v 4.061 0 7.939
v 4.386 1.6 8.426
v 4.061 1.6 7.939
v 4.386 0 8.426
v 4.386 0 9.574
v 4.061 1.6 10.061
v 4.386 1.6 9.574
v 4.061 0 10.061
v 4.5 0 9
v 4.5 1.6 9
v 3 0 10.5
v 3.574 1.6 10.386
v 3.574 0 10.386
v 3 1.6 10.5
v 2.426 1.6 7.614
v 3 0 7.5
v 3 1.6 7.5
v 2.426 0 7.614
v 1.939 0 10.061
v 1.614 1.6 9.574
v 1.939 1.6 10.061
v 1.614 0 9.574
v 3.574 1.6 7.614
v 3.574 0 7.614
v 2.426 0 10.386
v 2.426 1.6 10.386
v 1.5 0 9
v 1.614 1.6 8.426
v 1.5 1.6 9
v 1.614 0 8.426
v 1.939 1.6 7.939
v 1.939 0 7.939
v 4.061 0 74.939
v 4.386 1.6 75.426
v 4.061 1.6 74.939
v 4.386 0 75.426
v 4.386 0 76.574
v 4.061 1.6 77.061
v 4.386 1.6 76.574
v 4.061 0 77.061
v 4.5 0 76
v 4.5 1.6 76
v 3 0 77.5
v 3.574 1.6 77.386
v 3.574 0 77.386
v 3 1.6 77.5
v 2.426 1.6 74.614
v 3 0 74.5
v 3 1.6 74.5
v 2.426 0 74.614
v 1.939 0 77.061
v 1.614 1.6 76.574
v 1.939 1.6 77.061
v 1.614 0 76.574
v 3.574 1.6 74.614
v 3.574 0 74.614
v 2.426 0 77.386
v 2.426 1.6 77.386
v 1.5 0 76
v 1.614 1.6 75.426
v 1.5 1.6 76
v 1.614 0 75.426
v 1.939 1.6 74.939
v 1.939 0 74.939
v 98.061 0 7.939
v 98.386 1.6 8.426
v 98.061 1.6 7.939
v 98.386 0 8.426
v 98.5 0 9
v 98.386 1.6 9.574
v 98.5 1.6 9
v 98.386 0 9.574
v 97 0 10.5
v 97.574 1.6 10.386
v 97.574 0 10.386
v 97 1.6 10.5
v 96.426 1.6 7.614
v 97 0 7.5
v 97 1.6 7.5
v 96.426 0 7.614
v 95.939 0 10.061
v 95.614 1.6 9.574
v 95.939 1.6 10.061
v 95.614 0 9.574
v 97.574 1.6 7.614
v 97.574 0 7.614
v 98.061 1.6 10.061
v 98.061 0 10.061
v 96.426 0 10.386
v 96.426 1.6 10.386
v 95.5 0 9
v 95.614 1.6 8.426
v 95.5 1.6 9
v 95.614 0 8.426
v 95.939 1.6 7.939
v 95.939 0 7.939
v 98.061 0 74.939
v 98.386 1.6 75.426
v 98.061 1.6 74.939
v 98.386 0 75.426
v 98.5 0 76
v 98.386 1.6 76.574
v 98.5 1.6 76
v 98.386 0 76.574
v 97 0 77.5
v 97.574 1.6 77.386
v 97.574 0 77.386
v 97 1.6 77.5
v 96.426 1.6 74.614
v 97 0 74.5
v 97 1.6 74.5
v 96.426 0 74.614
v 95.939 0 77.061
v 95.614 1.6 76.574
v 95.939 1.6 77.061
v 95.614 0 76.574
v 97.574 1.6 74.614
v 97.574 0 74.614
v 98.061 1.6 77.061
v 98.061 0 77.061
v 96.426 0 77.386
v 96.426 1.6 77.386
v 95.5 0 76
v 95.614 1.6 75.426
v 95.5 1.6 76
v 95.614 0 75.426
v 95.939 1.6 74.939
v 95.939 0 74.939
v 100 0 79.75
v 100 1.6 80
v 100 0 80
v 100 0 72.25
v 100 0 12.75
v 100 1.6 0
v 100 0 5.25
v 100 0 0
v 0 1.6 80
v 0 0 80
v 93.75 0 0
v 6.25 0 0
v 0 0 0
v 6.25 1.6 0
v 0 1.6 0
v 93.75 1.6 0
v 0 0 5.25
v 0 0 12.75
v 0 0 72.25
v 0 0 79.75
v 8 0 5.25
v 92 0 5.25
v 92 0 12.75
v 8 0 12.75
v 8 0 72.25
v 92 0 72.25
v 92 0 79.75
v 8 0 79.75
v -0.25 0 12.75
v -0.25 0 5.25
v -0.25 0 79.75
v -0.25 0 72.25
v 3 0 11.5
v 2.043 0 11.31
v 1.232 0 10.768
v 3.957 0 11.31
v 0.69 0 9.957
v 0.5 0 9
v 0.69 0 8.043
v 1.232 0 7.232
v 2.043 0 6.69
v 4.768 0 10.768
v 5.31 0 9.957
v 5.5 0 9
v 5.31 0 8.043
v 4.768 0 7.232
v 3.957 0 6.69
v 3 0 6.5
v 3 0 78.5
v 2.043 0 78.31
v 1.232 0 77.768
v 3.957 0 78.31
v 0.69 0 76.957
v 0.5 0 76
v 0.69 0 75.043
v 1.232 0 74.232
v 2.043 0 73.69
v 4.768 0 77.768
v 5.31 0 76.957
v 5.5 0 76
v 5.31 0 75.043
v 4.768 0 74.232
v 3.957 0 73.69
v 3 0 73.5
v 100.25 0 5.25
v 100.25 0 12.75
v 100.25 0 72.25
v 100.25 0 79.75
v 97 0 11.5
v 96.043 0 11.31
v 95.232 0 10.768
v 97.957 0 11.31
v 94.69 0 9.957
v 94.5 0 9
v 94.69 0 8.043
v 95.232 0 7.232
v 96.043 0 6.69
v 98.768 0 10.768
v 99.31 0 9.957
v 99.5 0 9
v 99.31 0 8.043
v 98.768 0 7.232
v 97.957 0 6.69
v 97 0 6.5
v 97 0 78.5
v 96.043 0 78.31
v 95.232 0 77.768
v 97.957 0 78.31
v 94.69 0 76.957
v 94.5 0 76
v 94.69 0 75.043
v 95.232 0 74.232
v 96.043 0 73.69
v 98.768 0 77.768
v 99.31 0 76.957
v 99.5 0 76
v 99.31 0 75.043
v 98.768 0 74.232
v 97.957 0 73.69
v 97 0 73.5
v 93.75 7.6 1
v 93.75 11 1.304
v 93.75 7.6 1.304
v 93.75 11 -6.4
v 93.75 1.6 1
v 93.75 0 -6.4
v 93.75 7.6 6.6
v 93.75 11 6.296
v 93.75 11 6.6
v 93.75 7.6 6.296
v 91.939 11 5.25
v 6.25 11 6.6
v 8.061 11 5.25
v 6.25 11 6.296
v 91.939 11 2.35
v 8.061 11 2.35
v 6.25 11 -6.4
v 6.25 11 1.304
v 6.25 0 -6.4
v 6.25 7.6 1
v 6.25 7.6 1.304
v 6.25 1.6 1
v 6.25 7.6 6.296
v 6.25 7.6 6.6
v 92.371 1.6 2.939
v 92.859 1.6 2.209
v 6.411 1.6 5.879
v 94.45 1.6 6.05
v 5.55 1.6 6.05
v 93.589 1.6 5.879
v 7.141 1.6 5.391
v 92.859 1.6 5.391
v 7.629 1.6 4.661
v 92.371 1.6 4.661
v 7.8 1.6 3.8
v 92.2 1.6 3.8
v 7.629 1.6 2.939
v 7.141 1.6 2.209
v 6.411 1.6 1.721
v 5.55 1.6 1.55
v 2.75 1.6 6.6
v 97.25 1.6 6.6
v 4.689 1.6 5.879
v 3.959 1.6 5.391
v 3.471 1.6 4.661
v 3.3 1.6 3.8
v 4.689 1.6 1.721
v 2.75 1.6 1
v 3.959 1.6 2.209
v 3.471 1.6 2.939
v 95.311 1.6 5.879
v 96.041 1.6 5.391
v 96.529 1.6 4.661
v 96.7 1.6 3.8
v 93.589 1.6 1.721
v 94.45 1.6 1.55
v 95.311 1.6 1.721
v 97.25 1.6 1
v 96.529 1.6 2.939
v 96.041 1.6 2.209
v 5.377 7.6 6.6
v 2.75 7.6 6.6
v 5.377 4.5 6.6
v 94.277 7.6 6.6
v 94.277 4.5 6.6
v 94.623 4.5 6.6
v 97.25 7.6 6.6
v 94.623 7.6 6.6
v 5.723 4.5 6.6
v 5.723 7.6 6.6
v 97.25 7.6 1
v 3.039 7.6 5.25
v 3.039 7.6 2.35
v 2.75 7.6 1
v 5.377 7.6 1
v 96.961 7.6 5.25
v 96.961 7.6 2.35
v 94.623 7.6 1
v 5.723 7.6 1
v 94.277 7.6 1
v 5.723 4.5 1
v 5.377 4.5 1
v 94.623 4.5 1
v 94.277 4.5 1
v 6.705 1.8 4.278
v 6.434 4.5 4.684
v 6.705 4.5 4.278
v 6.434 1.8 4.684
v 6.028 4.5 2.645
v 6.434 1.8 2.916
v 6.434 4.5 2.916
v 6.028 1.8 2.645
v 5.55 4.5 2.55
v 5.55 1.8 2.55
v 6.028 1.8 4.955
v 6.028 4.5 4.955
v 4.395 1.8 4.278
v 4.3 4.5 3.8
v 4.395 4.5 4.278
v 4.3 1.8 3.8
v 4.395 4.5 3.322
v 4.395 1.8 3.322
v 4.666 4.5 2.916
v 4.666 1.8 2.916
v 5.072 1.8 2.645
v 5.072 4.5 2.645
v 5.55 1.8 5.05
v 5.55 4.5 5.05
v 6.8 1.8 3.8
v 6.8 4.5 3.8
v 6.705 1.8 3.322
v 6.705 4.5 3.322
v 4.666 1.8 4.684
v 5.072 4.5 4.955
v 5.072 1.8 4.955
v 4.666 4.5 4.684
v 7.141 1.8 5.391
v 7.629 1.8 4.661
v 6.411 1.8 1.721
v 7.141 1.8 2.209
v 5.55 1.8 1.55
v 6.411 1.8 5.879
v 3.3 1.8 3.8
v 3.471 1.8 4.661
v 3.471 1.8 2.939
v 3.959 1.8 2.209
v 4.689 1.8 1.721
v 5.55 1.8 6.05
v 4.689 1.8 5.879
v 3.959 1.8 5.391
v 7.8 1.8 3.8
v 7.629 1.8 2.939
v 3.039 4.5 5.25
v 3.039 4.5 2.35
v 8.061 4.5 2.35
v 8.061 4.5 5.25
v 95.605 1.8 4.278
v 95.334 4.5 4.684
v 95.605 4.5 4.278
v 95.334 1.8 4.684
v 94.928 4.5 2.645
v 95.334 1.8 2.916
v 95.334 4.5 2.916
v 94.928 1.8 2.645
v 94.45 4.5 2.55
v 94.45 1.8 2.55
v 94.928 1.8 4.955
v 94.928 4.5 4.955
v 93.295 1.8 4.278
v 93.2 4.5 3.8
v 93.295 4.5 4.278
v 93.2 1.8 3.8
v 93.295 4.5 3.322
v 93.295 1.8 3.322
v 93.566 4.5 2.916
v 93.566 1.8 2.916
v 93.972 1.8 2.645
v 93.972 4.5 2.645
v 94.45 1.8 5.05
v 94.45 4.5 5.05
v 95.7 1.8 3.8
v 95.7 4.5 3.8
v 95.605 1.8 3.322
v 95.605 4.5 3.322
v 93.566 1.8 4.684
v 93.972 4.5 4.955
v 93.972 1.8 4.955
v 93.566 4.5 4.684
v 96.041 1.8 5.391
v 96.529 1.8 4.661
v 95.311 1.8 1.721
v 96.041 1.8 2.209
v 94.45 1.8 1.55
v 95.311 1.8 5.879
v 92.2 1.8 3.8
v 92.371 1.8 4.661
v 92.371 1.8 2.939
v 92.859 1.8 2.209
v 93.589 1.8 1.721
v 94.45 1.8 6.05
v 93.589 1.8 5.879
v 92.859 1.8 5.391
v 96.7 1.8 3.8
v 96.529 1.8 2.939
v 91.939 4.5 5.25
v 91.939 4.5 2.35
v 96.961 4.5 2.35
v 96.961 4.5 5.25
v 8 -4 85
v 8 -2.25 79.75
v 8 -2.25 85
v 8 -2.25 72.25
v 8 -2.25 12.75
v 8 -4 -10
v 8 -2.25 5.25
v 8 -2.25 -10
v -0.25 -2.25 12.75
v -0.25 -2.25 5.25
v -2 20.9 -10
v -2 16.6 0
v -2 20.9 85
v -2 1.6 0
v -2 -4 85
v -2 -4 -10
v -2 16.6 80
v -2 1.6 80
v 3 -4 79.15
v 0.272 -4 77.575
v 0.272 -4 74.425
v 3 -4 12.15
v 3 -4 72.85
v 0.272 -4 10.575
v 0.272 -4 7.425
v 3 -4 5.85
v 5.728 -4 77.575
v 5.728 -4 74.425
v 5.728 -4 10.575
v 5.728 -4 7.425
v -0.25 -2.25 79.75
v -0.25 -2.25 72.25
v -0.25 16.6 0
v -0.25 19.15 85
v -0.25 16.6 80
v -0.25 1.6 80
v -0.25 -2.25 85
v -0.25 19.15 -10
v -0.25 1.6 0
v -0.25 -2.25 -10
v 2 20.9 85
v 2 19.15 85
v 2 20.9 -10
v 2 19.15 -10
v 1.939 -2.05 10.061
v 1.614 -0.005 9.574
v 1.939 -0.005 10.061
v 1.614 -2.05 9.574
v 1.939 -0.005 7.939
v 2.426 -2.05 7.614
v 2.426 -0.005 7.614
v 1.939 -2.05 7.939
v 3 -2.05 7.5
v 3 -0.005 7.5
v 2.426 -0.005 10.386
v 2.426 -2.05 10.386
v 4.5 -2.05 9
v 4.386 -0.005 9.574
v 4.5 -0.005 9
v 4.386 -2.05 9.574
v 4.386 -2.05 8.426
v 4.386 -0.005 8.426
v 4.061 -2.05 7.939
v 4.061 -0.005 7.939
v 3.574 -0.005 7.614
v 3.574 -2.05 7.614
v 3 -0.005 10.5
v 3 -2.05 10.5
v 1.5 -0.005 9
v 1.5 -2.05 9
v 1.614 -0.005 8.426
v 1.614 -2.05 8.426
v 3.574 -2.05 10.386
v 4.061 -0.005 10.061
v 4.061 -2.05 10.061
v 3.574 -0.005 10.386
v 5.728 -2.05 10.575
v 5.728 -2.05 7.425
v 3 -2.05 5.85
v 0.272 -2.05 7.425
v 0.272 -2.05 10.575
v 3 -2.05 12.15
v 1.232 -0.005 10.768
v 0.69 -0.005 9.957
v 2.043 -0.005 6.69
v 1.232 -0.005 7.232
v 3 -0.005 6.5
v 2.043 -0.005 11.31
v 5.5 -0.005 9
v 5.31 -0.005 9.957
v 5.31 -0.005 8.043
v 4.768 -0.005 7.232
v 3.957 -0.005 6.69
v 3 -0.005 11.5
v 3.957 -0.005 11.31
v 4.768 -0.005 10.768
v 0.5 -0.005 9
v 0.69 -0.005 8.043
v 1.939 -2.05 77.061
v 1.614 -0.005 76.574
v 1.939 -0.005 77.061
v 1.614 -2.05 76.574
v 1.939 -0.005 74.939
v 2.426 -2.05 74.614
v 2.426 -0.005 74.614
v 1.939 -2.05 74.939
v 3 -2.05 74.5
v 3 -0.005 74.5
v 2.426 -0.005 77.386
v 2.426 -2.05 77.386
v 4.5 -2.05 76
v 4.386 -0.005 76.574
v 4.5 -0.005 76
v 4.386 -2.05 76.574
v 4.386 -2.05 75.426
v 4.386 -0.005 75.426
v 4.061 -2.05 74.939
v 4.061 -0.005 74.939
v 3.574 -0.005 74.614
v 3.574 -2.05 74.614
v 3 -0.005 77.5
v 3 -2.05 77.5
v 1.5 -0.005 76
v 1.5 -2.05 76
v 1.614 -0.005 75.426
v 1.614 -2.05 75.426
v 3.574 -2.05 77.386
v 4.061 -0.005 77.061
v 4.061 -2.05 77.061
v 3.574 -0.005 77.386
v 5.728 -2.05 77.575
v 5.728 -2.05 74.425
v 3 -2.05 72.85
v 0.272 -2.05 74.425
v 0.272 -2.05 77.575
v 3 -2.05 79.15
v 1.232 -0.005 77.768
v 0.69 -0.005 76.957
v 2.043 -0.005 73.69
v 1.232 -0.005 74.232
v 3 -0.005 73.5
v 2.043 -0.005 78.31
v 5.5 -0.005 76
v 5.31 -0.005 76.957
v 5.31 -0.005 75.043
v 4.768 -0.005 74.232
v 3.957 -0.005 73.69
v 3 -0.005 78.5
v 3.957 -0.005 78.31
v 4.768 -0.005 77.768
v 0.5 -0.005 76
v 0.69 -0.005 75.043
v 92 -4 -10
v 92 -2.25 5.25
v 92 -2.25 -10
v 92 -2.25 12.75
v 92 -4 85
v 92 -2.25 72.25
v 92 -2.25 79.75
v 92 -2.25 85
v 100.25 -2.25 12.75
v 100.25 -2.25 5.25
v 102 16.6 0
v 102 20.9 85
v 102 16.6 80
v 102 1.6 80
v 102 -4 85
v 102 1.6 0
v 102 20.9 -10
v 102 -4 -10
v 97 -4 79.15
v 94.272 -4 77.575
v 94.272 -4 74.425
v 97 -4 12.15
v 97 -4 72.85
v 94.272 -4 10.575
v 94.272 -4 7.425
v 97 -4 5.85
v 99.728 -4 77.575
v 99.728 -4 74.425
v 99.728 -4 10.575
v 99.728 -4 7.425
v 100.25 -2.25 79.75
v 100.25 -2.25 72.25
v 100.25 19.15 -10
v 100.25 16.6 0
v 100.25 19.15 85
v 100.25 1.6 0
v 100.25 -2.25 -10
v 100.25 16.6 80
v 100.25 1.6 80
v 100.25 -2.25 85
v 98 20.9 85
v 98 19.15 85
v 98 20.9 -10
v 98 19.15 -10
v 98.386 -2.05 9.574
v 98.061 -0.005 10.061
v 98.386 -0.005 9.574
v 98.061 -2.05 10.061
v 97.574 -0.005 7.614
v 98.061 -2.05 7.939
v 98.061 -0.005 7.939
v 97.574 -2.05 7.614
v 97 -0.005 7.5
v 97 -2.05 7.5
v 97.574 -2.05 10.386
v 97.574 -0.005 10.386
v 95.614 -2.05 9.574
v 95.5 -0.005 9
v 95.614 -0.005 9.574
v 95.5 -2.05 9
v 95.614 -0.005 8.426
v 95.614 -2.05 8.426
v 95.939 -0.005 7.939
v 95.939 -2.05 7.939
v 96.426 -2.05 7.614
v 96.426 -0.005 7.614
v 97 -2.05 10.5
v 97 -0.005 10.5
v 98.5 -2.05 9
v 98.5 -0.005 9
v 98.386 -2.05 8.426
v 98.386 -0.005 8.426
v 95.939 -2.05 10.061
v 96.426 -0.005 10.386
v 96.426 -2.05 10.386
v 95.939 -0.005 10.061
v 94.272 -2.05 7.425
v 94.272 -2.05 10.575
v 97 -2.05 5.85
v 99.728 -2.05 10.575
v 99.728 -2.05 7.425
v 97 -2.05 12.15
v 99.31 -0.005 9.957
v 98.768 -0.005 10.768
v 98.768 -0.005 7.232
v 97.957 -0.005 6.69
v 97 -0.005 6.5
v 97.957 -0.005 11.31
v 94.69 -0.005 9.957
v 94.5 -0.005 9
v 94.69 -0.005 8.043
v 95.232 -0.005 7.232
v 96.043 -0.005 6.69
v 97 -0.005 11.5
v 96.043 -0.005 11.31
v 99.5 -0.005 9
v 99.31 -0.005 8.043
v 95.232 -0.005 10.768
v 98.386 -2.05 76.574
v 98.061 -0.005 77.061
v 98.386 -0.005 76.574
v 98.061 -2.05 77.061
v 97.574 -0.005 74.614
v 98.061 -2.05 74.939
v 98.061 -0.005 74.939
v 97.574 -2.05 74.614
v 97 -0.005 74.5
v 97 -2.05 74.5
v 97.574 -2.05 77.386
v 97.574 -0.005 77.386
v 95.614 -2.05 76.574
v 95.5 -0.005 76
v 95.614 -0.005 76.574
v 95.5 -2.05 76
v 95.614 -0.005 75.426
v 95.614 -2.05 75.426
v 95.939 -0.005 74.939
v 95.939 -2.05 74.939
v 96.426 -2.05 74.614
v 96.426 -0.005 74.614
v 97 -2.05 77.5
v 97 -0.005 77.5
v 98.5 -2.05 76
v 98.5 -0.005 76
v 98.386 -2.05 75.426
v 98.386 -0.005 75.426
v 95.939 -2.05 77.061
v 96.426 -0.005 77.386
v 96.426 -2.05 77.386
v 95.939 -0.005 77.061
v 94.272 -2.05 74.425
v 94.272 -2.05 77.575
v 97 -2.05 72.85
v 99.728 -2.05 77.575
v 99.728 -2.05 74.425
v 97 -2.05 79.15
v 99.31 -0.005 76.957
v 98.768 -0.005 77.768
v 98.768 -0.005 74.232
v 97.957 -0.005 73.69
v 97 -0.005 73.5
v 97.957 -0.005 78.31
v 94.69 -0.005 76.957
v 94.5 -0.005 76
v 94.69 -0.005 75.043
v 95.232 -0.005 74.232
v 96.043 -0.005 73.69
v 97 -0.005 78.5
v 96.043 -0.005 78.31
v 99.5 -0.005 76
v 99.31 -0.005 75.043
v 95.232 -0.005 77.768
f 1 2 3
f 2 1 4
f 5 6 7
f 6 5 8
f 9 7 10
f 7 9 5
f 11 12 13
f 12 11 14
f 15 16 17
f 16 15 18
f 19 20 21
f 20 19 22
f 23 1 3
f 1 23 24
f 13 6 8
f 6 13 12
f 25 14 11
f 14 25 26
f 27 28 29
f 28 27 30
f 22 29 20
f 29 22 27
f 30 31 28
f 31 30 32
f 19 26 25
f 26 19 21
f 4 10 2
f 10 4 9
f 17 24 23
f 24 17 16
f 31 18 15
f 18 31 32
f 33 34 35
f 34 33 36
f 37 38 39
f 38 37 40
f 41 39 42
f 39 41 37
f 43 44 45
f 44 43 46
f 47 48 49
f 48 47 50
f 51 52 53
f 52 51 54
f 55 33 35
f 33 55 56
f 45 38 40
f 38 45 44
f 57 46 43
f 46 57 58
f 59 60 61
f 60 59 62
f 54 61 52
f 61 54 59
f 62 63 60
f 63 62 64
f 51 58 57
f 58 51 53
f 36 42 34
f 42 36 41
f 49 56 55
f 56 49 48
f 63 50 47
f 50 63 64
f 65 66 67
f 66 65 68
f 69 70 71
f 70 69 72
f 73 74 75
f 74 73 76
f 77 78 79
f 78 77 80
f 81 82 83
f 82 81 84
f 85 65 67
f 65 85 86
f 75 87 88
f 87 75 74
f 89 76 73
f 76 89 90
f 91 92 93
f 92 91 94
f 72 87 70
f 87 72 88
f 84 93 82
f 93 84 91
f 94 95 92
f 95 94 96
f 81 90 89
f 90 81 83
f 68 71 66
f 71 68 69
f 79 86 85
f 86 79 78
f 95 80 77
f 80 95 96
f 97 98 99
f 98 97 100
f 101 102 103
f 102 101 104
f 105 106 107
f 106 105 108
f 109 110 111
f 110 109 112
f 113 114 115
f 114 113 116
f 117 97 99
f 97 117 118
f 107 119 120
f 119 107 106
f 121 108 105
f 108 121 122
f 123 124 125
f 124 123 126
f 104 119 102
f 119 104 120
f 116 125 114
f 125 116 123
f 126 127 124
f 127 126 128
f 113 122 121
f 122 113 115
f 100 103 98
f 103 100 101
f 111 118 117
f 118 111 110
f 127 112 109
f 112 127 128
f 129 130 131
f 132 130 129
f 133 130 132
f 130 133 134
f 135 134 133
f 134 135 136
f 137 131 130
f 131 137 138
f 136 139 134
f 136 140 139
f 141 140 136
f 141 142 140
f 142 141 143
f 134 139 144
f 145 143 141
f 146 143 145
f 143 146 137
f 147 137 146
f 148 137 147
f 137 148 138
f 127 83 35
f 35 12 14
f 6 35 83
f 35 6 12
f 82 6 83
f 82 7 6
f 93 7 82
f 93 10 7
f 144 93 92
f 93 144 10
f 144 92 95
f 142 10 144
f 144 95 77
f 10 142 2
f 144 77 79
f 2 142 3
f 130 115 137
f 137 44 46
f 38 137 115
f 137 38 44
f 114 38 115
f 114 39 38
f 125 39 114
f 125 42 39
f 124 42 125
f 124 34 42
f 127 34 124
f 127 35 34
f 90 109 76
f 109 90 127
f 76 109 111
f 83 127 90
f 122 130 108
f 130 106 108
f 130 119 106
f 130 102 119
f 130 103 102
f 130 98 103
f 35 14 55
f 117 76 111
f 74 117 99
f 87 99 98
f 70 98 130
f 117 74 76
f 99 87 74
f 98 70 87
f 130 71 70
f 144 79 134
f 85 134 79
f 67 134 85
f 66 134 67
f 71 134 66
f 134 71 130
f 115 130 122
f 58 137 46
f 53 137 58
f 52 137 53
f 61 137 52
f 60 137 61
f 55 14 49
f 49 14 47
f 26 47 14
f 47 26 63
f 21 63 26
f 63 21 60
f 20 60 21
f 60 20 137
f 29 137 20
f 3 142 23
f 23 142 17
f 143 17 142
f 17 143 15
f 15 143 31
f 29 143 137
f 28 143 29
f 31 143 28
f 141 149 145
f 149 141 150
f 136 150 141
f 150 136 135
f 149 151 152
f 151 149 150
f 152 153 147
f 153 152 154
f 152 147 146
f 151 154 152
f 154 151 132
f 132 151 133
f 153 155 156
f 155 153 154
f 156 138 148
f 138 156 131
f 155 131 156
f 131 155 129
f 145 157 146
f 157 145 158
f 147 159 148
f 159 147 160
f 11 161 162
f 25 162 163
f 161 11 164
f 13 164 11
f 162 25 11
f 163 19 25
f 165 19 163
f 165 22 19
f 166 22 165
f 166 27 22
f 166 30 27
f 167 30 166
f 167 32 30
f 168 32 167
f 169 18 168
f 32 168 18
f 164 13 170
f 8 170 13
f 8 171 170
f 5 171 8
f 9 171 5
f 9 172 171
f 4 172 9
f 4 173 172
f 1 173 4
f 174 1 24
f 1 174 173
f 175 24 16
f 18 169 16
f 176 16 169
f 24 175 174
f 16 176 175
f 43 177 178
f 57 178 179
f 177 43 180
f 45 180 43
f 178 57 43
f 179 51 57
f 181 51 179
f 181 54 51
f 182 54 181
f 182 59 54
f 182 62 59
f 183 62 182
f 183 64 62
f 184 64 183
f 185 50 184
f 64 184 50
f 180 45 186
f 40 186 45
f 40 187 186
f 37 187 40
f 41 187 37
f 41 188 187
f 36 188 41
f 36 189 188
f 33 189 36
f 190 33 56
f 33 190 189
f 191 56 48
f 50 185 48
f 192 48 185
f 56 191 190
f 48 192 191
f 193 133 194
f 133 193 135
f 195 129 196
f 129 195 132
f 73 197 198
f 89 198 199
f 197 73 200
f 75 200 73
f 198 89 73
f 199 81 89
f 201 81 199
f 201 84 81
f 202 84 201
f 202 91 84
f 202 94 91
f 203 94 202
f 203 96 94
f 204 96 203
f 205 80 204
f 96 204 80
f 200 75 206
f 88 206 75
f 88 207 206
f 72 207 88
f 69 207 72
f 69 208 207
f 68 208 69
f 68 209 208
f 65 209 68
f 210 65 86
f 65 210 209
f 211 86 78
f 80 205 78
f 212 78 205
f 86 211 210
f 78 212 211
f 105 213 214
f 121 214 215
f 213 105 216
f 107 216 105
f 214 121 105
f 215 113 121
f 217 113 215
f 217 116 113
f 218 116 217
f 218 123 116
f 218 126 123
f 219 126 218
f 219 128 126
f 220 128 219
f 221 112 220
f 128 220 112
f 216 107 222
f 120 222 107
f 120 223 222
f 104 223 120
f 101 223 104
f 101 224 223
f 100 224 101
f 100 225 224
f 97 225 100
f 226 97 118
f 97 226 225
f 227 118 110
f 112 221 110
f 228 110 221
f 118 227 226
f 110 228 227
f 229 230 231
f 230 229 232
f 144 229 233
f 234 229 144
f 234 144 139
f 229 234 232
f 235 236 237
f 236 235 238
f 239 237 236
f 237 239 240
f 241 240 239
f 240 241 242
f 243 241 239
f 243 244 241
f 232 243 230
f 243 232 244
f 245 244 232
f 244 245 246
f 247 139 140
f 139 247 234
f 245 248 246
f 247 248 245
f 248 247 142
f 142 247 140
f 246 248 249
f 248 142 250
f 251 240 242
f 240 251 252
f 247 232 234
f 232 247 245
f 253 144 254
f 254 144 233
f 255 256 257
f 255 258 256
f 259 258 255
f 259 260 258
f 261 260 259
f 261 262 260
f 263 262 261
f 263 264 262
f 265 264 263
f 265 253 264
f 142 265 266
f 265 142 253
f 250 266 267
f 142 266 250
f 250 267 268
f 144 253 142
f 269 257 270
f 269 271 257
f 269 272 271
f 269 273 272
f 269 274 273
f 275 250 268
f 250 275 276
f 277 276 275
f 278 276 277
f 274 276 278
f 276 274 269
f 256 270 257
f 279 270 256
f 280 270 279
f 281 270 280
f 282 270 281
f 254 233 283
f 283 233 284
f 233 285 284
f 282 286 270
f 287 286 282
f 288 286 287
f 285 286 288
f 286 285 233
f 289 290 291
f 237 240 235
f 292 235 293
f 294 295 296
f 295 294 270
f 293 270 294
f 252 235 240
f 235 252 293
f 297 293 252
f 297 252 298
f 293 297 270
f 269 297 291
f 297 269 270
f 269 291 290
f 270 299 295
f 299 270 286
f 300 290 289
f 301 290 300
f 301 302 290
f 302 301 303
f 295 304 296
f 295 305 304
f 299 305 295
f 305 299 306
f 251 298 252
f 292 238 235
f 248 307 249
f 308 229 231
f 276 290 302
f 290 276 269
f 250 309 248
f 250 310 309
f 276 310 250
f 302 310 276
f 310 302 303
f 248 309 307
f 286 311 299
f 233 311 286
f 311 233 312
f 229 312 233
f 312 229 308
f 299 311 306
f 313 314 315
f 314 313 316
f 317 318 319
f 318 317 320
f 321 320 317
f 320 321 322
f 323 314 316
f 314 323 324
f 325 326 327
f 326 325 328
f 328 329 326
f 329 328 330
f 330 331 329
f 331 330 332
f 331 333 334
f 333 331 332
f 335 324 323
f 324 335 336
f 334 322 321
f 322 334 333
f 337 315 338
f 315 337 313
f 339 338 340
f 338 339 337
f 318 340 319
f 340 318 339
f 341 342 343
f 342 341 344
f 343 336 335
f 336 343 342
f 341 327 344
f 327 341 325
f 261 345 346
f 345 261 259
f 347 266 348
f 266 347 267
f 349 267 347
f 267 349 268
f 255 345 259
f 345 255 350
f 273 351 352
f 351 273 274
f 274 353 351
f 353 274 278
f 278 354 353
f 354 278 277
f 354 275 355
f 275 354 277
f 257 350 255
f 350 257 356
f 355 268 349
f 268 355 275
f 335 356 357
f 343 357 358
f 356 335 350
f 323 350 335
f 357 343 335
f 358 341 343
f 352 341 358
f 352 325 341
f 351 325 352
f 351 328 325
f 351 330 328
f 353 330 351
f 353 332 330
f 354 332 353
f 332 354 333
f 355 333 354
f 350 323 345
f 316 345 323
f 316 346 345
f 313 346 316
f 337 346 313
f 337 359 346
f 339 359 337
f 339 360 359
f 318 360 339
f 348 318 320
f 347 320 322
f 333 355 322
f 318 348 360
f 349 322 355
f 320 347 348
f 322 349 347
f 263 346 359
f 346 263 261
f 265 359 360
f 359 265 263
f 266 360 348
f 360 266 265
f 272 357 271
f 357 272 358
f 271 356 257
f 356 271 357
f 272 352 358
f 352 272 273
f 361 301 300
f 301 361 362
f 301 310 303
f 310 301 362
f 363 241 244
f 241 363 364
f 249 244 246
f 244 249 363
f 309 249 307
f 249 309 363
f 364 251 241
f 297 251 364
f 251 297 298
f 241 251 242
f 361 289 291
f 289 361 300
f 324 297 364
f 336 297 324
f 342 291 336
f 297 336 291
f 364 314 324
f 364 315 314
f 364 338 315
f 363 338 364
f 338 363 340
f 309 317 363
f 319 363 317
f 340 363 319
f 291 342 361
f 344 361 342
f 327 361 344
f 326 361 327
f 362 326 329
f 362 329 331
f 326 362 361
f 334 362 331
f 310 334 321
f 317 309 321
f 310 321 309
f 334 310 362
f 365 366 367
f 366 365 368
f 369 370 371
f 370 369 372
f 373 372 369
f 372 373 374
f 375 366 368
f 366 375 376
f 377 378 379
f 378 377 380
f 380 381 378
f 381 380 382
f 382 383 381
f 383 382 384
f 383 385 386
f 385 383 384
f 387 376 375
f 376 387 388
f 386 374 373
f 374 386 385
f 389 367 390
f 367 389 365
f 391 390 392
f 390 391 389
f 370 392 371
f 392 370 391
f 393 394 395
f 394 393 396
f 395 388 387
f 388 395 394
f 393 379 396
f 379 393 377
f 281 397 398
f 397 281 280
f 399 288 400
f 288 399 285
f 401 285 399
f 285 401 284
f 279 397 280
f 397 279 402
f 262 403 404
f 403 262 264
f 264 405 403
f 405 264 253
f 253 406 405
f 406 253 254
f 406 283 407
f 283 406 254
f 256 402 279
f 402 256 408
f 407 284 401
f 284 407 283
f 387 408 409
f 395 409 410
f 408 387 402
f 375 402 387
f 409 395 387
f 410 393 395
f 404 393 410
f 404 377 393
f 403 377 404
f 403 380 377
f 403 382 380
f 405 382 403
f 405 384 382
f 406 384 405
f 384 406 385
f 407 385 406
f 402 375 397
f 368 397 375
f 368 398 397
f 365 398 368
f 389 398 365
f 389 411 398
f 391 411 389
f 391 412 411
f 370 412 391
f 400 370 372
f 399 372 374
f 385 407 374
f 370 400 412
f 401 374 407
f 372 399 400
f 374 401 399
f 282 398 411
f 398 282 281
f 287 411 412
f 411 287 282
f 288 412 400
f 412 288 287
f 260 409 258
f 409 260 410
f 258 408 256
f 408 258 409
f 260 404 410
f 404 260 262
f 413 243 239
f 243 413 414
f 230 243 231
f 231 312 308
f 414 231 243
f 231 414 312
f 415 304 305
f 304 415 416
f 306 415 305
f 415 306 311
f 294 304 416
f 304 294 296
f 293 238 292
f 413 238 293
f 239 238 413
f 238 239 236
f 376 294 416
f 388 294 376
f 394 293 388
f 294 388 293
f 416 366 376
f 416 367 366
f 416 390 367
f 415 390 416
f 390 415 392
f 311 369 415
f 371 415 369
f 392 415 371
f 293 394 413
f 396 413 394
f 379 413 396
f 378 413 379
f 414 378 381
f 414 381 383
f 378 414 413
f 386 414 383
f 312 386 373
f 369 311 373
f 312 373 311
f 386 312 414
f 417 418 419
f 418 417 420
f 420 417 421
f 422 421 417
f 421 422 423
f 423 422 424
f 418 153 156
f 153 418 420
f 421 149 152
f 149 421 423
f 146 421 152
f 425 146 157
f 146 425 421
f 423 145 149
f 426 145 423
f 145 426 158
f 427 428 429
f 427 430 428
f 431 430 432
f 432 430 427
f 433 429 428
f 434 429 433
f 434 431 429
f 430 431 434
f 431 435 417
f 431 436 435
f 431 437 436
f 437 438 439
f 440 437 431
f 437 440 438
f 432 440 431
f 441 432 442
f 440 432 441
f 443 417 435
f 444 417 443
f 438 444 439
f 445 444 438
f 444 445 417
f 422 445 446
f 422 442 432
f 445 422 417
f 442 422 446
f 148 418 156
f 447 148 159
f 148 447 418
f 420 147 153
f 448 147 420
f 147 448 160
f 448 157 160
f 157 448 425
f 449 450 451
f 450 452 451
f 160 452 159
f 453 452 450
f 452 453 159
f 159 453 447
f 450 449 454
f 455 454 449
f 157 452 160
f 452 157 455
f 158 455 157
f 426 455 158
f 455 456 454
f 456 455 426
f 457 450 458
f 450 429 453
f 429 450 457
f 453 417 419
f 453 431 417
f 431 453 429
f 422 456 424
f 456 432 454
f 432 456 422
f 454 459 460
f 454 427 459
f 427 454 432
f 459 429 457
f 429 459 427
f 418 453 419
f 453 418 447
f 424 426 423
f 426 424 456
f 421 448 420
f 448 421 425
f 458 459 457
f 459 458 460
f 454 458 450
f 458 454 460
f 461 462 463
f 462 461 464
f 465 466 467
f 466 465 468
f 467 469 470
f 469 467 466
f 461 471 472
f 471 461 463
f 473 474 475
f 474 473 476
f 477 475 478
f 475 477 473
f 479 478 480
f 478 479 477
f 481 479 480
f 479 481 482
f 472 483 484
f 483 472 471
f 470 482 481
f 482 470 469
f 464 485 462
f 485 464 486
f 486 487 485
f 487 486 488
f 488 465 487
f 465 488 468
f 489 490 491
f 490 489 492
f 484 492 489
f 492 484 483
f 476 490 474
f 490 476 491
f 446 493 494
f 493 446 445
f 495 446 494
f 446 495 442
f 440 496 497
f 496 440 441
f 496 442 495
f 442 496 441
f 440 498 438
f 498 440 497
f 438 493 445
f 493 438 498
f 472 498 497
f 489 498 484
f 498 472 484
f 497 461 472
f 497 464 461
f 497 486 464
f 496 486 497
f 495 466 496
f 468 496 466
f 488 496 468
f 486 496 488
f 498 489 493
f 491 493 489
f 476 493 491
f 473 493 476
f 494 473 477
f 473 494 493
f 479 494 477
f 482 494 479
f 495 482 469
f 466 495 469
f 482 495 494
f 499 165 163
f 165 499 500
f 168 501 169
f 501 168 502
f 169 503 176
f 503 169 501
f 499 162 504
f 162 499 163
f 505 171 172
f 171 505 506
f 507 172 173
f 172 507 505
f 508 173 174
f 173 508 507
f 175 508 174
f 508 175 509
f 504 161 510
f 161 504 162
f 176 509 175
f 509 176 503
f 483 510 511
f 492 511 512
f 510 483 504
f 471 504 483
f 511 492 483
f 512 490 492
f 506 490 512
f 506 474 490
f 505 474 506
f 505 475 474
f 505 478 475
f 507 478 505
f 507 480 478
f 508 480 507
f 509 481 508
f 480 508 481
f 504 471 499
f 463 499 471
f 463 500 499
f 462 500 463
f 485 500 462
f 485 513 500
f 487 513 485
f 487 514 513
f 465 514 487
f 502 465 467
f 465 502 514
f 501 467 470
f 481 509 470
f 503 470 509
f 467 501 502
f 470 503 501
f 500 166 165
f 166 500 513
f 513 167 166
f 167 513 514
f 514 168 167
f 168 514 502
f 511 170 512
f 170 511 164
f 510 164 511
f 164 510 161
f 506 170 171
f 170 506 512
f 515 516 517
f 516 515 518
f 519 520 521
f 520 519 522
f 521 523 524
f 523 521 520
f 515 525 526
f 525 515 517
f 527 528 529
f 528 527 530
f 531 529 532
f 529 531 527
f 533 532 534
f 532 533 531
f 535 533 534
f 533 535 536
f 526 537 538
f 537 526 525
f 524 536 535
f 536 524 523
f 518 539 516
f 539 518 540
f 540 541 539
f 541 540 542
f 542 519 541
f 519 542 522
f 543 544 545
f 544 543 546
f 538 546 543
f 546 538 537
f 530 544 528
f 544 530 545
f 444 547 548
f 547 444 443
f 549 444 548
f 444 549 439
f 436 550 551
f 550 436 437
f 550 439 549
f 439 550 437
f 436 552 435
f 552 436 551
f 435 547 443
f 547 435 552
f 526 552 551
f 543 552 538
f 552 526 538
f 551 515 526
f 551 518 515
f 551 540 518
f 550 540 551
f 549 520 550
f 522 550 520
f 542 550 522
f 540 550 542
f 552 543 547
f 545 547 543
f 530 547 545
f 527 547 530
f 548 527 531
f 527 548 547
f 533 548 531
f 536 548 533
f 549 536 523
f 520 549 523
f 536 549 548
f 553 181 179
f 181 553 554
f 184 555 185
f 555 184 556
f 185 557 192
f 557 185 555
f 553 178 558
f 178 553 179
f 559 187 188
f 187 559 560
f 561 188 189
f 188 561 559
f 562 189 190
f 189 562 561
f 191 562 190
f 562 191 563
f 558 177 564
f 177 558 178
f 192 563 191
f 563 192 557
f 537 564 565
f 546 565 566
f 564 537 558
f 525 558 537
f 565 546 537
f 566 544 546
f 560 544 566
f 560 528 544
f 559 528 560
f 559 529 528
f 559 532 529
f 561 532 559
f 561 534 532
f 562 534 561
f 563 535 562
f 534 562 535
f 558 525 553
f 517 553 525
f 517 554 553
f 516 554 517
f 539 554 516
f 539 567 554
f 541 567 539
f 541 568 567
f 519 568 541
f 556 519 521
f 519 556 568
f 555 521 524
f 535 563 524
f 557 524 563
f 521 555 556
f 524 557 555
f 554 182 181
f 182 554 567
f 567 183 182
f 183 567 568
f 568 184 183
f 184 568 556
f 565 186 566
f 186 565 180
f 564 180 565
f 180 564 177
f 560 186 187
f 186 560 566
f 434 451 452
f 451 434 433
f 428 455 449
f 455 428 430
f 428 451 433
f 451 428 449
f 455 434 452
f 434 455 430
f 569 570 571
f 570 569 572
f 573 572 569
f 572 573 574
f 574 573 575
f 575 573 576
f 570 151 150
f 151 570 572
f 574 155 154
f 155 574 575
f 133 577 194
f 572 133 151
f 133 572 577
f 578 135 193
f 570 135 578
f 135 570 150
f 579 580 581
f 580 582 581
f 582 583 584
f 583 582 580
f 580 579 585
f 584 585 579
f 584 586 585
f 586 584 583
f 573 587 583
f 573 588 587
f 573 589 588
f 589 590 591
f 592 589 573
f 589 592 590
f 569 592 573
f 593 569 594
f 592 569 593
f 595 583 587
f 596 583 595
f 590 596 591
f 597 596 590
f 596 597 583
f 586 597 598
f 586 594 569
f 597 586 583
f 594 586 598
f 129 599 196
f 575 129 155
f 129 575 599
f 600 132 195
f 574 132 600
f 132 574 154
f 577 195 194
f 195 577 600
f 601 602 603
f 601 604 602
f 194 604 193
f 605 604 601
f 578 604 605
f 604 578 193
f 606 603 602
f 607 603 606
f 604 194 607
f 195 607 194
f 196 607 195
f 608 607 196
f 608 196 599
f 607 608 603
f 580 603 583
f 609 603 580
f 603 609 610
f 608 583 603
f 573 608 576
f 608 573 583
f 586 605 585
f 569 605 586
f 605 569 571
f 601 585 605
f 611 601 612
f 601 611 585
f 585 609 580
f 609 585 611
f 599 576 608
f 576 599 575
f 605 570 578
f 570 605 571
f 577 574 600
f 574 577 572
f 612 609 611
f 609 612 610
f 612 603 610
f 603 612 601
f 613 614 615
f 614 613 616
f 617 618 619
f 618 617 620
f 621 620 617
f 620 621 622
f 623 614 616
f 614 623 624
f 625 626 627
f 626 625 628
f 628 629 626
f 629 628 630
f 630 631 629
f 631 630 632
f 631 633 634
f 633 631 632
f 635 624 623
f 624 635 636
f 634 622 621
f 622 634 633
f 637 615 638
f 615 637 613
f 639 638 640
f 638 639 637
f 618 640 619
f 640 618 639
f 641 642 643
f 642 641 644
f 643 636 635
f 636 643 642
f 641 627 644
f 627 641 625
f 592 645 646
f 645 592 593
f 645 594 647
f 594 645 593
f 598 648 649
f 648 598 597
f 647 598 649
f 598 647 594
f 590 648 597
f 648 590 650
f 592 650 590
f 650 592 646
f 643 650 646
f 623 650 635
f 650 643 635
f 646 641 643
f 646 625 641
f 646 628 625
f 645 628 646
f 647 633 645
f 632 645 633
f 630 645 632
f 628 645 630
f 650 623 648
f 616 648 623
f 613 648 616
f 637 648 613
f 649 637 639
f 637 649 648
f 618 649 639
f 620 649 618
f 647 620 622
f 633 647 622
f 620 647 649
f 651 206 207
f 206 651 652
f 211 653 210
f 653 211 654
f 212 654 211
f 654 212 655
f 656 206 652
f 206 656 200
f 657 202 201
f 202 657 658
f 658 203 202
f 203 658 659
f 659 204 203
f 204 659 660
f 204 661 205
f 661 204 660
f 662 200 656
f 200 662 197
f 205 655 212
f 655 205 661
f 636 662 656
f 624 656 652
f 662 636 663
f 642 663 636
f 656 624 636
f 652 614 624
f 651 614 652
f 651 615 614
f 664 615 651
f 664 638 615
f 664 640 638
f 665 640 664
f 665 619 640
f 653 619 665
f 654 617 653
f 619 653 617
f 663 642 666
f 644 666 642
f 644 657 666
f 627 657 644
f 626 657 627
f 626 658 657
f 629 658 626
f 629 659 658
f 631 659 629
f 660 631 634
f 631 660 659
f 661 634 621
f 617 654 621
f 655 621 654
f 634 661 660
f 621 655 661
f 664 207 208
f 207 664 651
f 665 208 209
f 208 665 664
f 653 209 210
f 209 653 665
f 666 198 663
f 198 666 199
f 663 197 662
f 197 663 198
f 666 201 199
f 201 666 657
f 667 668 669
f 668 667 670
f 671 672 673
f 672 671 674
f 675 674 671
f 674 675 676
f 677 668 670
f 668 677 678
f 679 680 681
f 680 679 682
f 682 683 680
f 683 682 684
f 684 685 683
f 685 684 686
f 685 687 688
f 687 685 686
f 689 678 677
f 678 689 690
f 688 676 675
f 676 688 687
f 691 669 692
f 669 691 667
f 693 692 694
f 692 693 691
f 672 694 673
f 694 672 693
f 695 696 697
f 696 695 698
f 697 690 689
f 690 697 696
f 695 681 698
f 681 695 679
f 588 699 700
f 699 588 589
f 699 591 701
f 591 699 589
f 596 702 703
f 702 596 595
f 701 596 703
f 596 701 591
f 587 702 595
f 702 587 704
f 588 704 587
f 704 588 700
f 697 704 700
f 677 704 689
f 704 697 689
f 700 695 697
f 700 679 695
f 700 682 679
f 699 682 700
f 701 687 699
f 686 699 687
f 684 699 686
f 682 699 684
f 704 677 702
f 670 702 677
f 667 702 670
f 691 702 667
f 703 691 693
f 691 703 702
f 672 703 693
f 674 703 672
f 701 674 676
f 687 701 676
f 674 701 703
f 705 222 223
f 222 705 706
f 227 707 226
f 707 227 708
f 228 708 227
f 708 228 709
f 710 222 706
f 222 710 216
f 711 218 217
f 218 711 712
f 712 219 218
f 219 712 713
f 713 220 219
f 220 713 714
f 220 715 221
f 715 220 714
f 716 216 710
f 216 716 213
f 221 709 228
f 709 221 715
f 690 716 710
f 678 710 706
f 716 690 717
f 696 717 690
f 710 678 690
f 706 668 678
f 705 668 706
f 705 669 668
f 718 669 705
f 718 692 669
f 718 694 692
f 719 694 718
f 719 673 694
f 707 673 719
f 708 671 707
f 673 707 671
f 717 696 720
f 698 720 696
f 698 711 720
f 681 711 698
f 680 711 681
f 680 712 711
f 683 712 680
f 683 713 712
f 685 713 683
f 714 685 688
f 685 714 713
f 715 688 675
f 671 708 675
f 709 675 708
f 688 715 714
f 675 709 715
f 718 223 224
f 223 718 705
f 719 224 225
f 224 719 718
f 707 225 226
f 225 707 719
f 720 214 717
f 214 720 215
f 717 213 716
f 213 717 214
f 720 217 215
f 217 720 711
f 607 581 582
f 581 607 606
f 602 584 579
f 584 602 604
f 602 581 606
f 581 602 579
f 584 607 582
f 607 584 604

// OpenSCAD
// file: ../library/din41612/din41612_male_dim.scad
include <../linurs/linurs_screw_dim.scad>

// connector dimensions
din41612_male_l=94.5;    // lenght of the connector
din41612_male_l1=87.5;   // 
din41612_male_w=13;      // width of the connector
din41612_male_w1=6.4;    // 
din41612_male_w2=5.6;    // 
din41612_male_h=11;      // height of the connector
din41612_male_h1=1.6;    // 
din41612_male_h2=6;      // 

din41612_male_dl=88.9;   // distance between mounting holes
// file: ../library/din41612/din41612_female_dim.scad
include <../linurs/linurs_screw_dim.scad>

// connector dimensions
din41612_female_l=95;       // lenght of the connector
din41612_female_l1=85;      // lenght of the connector head
din41612_female_h=11.6;     // height of the connector
din41612_female_h1=5.2;     // height produced by the connector when pulgged in 
din41612_female_w=11;       // width of the connector
din41612_female_w1=8.5;     // width of the connector head

din41612_female_dl=90;      // distance between mounting holes
// file: ../library/din41612/din41612_male.scad
// din41612 male connector
// =======================

include <din41612_male_dim.scad>

use <../linurs/linurs_screw.scad>

module din41612_male(){ 
  // color("LightGrey")
  difference(){
    union(){
        translate([0,din41612_male_w1/2,din41612_male_h/2-din41612_male_h1])  
        cube([din41612_male_l1,
              din41612_male_w1,
              din41612_male_h],
             center=true);  
      translate([0,(din41612_male_w1-din41612_male_w)/2,(din41612_male_h-din41612_male_h1)/2]) 
        cube([din41612_male_l1,
              (din41612_male_w-din41612_male_w1),
              din41612_male_h-din41612_male_h1],
             center=true);  
      translate([0,din41612_male_w2/2+din41612_male_w1-din41612_male_w,din41612_male_h2/2])
        cube([din41612_male_l,
              din41612_male_w2,
              din41612_male_h2],
             center=true);  
    }
    for(i=[-1,1]){ // mounting holes
      translate([i*din41612_male_dl/2,
                 din41612_male_w1-din41612_male_w+din41612_male_w2/2, 
                 din41612_male_h1])
      rotate([180,0,90])screw_fix(
            w=din41612_male_h2, 
            d=M2_5, 
            type=head_cyl, 
            nut_sink=din41612_male_h,
            t=0);
    }
  }
}
din41612_male();  
// file: ../motherboard/motherboard_dim.scad
include <../library/linurs/linurs_screw_dim.scad>
include <../library/din41612/din41612_female_dim.scad>
include <../library/din41612/din41612_male_dim.scad>
include <../pcb/pcb_dim.scad>
// motherboard pcb dimensions
motherboard_l=pcb_l;   // pcb width
motherboard_h=1.6;     // pcb thickness
step=25.4;             // distance between modules

function motherboard_w(n)=din41612_female_w+step*(n-1);

screw_motherboard_d=M2_5;
screw_motherboard_l=16;
motherboard_pass=0.5;// gap to fit screws 

motherboard_z_offset=-din41612_male_w1-din41612_female_h1-motherboard_h;
// file: ../pcb/pcb_dim.scad
// The pcb is the master object of the project
// therefore no other include files from other objects
// are necessary

// pcb constants
pcb_l =100;  // lenght of the pcb
pcb_ld = 94; // hole distance 
pcb_w=80;    // height of the pcb
pcb_wd = 67; // hole distance
pcb_wd1 = 9; // hole to edge distance 
pcb_d=3;     // diameter of holes
pcb_h=1.6;   // thickness
// file: ../library/linurs/linurs_screw_dim.scad
// Metric screws and nuts 
// urs@linurs.org

// contains dimensions of linurs_screw and can be included in other 
// OpenScad files 

// Parameters in this file
// d screw diameter M2_5, M3, ... (enumeration with screw_d)
// t millimeters added to diameters 

// enumerations of metric threads
M2_5=0;
M3=1;
M4=2;
M5=3;

// enumerations screw head type
head_cyl=0; // cylinder
head_cnt=1; // countrsunk
head_no=2;  // no head at all
head_hex=3;  // no head at all

// screw diameters
screw_d=[
2.5, // M2.5
3.0, // M3
4.0, // M4
5.0  // M5
];

// sizes for hex nuts
screw_hex=[
//   s,   e,   h
 [ 5.0, 5.8, 1.7], // M2.5
 [ 5.5, 6.4, 2.0], // M3
 [ 7.0, 8.1, 2.8], // M4
 [ 8.0, 9.2, 3.5]  // M5
];

// sizes for cylinder screw heads
screw_cyl=[
//   d,   h
 [ 4.5, 1.6], // M2.5
 [ 5.5, 2.0], // M3
 [ 7.0, 2.6], // M4
 [ 8.5, 3.3]  // M5
];

// sizes for countersunk screw heads
screw_cnt=[
//   d,   h
 [ 4.7, 1.50], // M2.5
 [ 5.6, 1.65], // M3
 [ 7.4, 2.20], // M4
 [ 9.2, 2.50]  // M5
];
// file: ../bracket/bracket_dim.scad
// bracket

include <../pcb/pcb_dim.scad>
include <../motherboard/motherboard_dim.scad>
include <../library/linurs/linurs_screw_dim.scad>

bracket_screw=M2_5;   // hole for the screw

bracket_gap=0.5;      // gap between bracket to make sure it fits in the box
bracket_screw_gap=0.5;// gap to fit the screw

bracket_l=pcb_w+15;   // height of bracket
bracket_l1=19;        // hole l
bracket_l2=3*screw_d[bracket_screw];
bracket_ld=pcb_wd;    // hole distance

bracket_h=10;         // depth of the U shape at the side of the screw
bracket_h1=4;         // depth of the U shape at the side where no screw is 
bracket_h2=2-bracket_gap/2;   // thickness of bracket
bracket_h3=5;         // hole h

bracket_w1=4;         // height of the mounting hole cube
bracket_tn=2;         // thickness of bracket
bracket_t=bracket_tn-bracket_gap/2;  // thickness of bracket - gap

bracket_offset_z=-10;  // bracket offset in elecbox z axis

function bracket_w(n)=step*n-bracket_gap;
function bracket_w2(n)=step*n-2*bracket_tn;
// file: ../pcb/pcb.scad
// pcb
// ===
// The pcb is the master object and has its 
// lower left corner solder side at the origin of the 
// coordinate system 

n=2;  // [1,2,3,4,5,6,7,8]
show_pcb="assemblies"; // [assemblies,assembly,pcb]

include <pcb_dim.scad>
include <../motherboard/motherboard_dim.scad>

use <../library/din41612/din41612_male.scad>

module pcb(){
  echo("pcb");  
  color("greenyellow")
  difference(){
    cube([pcb_l,pcb_h,pcb_w]); // pcb
    for(x=[-1,1]){ // mounting holes
      for(y=[pcb_wd1,pcb_wd1+pcb_wd]){
        translate([x*pcb_ld/2+pcb_l/2,0,y])
        rotate([90,0,0])
        cylinder(d=pcb_d,h=3*pcb_h,center=true,$fn=16);
      }
    }
  }
}

module pcb_assembly(){
  echo("pcb assembly");  
  pcb();  
  translate([pcb_l/2,pcb_h,0])  
  rotate([-90,0,0])din41612_male();  
}

module pcb_assemblies(n=1){
  echo("pcb assemblies"); 
  for(i=[0:n-1]){ // add the connectors
      echo(i);
      translate([0,step*i,0])
      pcb_assembly();
  }    
}    

if(show_pcb=="assemblies"){
  pcb_assemblies(n=n);
}

if(show_pcb=="assembly"){
  pcb_assembly();
}

if(show_pcb=="pcb"){
    // Move to center to create 2D drawings from top view 
    // with script OpenSCAD22d.py
    //
    rotate([90,0,180])
    //
    translate([-pcb_l/2,-pcb_h/2,-pcb_w/2])
    pcb();
}
// file: ../bracket/bracket.scad
// bracket
// =======
// A bracket of the elecbox module
// - type: 0 front bracket, 1 rear bracket
// - width 1..n in steps

// parameters for customizer
// bracket width
n=2; // [1,2,3,4,5,6,7,8]
// type
bracket="Front"; // [Front,Back]
// intermediate mounting holes
intermediate=false;  

include <../pcb/pcb_dim.scad>

include <../motherboard/motherboard_dim.scad>
include <../library/linurs/linurs_screw_dim.scad>
include <bracket_dim.scad>

use <../library/linurs/linurs_screw.scad>
    
module back_bracket(n=1, intermediate=false){
  mirror([1,0,0])       // mirror it if desired
  front_bracket(n=n, intermediate=intermediate); 
}
    
module front_bracket(n=1, intermediate=false){
  echo("bracket");  
  //color("White")
  intermediatestep=(intermediate)?step:0; 
  difference(){
    union(){
      translate([-bracket_h2/2-bracket_gap/2,
                 bracket_w(n)/2-bracket_w1,
                 bracket_l/2])  
      cube([bracket_h2,
            bracket_w(n),
            bracket_l],center=true); // create the bracket front
  
      translate([bracket_h/2-bracket_h2-bracket_gap/2,
                 bracket_t/2-bracket_w1,
                 bracket_l/2]) 
      cube([bracket_h,
            bracket_t,
            bracket_l],center=true); // U shape side of the screw
      
      translate([bracket_h1/2-bracket_h2-bracket_gap/2,
                 bracket_w(n)-bracket_w1-bracket_t/2,
                 bracket_l/2]) 
      cube([bracket_h1,
            bracket_t,
            bracket_l],center=true); // U shape where no screw  
      for(x=[1:n]){  // create the mounting hole cubes 
        for(z=[bracket_l1,
               bracket_l1+bracket_ld]){
          translate([ bracket_h/2-bracket_h2-bracket_gap/2,
                     -bracket_w1/2+(x-1)*intermediatestep,
                     z])
          cube([bracket_h,
                bracket_w1,
                bracket_l2],center=true);
        }
      }   
    }
    for(x=[1:n]){ // create the mounting hole 
      for(z=[bracket_l1,
             bracket_l1+bracket_ld]){
        translate([bracket_h3-bracket_h2-bracket_gap/2,
                  -bracket_w1/2+(x-1)*intermediatestep,
                   z])
        rotate([0,90,0])
        rotate([-90,0,0])
        screw_fix(w=bracket_w1,d=bracket_screw,type=head_no, t=bracket_screw_gap);
      }
    }
  }
}

if(bracket=="Front"){
  front_bracket(intermediate=intermediate,n=n);
}

if(bracket=="Back"){
  back_bracket(intermediate=intermediate,n=n);
}
// file: ../library/linurs/linurs_screw.scad
// Metric screws and nuts 
// urs@linurs.org 2019
// It is targeted for 3D printing applications. 
// To look realistic is not the goal (Example: Nuts do not have a hole)

include <linurs_screw_dim.scad>

d=0; //[0:M2_5,1:M3,2:M4,3:M5]
type=0;//[0:head_cyl,1:head_cnt,2:head_no,3:head_hex]
w=15; 
i=10;
nut_sink=0;
screw_sink=0; 
t=0.01;
fn=16;

/* [hex_bolt] */
show_hex_bolt=false;

/* [nut] */
show_nut=false;

/* [screw] */
show_screw=false;

/* [screw_fix] */
show_screw_fix=false;

/* [screw_cut] */
show_screw_cut=false;

/* [nut_cut] */
show_nut_cut=false;
wi=0; 
rot=false;

// functions used multiple times to position nuts and heads
function headh_cyl(d)=screw_cyl[d][1];  // height of cyl screw head
function headh_cnt(d)=screw_cyl[d][1];  // height of cnt screw head
function headh(d,type=head_cyl)=(type==head_cyl ? headh_cyl(d) : (type==head_cnt ? headh_cnt(d) : 0 )); // height of screw head 

function nuth(d)=screw_hex[d][2];   // height of hex nut

// head of a cylinder screw
module screw_head_cyl(d=M3, t=0)
{
  screwhd=screw_cyl[d][0]+t; // diameter of cylinder screw head
  cylinder(d=screwhd,h=headh(d=d, type=head_cyl), center=true,$fn=16); // screw head
}

// head of a countersunk screw
module screw_head_cnt(d=M3, t=0)
{
  screwd=screw_d[d]+t; 
  screwhd=screw_cnt[d][0]+t; // diameter of cylinder screw head
  cylinder(d1=screwd,d2=screwhd,h=headh(d=d,type=head_cnt), center=true,$fn=16); // screw head
}

// head of a hex screw
module screw_head_hex(d=M3, t=0)
{
    translate([0,0,-nuth(d)/2])nut(d=d, t=t);
}

// head of all screws
module screw_head(d=M3, type=head_cyl, t=0)
{ 
  if(type==head_cnt){
    screw_head_cnt(d=d, t=t);
  } else {
    if(type==head_cyl){
      screw_head_cyl(d=d, t=t);
    } else {
       if(type==head_hex){
           screw_head_hex(d=d, t=t); 
       } 
    }    
  }
}

// hex bolt 
module hex_bolt(d=M3, w=10, t=0)
{
  nutd=screw_hex[d][1]+t; // outer diameter of hex bolt
  cylinder(r=nutd/2,h=w+t, center=true,$fn=6); // nut
}

// nut 
module nut(d=M3, t=0)
{
  hex_bolt(d=d, w=nuth(d), t=t);    
}

// screw 
// w outer width of the screw = screw length + head 
module screw(w=10, d=M3, type=head_cyl, t=0){
  screwd=screw_d[d]+t;       // screw diameter
  cylinder(d=screwd, h=w, center=true,$fn=16); // screw thread length
  translate([0,0,w/2-headh(d=d,type=type)/2])
  screw_head(d=d,type=type, t=t);
}

// screw fix
// w outer width of the screw = screw length + head 
// sink additional material below to remove 
// raise additional material above to remove
module screw_fix(w=10, d=M3, type=head_cyl, screw_sink=0, nut_sink=0, t=0){
  screw(w=w, d=d, type=type, t=t);
  translate([0,0,-w/2+nuth(d)/2])
    nut(d=d,t=t);
  //additional material to be removed above the nut  
  translate([0,0,-(w+nut_sink)/2])hex_bolt(d=d,w=nut_sink+0.01,t=t);    
  //additional material to be removed above the screw head
  if(type==head_cnt){  
    translate([0,0,w/2+screw_sink])
    cylinder(d=screw_cnt[d][0]+t,h=screw_sink+0.01,center=true,$fn=16);
  }else{ 
    translate([0,0,(w+screw_sink)/2])
    cylinder(d=screw_cyl[d][0]+t,h=screw_sink+0.01,center=true,$fn=16);
  }     
}

// screw cut
// material to be extracted from object to slide in a counter sunk screw for fixation
// w height of the cut out
// i depth of the screw
module screw_cut(d=M3,w=20,i=10,t=0,fn=32){
    hsh=screw_cnt[d][1];
    ws=screw_cnt[d][0]+t;
    ds=screw_d[d]+t;
    
    translate([i/2,0,-(w-hsh)/2])
      cube([i,ws,hsh],center=true);
    
    translate([0,0,-(w-hsh)/2])
      cylinder(d=ws,h=hsh,center=true,$fn=32);
    
    translate([0,0,-(w-hsh)/2+hsh])
        cylinder(d2=ds, d1=ws, h=hsh,center=true,$fn=fn);
    
    cylinder(h=w, d=ds, center=true, $fn=fn);   
    
    translate([i/2,0,0]) 
        cube([i,ds,w],center=true);
    
    for(y=[-1,1]){
        translate([i/2,y*ds/2,-w/2+hsh])
            rotate([45,0,0])
            cube([i,sqrt(2)*(ws-ds)/2,sqrt(2)*(ws-ds)/2],center=true);
    }
}
//screw_cut();

// nut cut
// material to be extracted from object to slide in a nut for fixation
// w height of the cylinder
// i lenght of the inlet
module nut_cut(w=10, wi=0, d=M3, i=10, t=0, rot=false,type=head_cyl){ 
  r=(rot)?90:0;
  ds=(rot)?screw_hex[d][1]:screw_hex[d][0];
  rotate([0,0,r])nut(d,t);
  translate([i/2,0,0])
    cube([i,ds+t,nuth(d)+t],center=true);
  translate([0,0,-wi])
      if(type==head_cnt){    
          screw(w=w, d=d, type=type, t=t); 
        translate([0,0,w/2])
          cylinder(d=screw_cnt[d][0]+t,h=raise,center=true,$fn=16);
      }
      else{ 
          screw(w=w, d=d, type=type, t=t);   
  //      translate([0,0,0])
          //#cylinder(d=screw_cyl[d][0]+t,h=w,center=true,$fn=16);
      }       
}

if(show_hex_bolt==true){
   hex_bolt(d=d, w=w, t=t);
}

if(show_nut==true){
  nut(d=d, t=t);
}    

if(show_screw==true){
   screw(w=w, d=d, type=type, t=t);
}

if(show_screw_fix==true){
  screw_fix(w=w, d=d, type=type, nut_sink=nut_sink, screw_sink=screw_sink, t=t);
}

if(show_screw_cut==true){
  screw_cut(d=d,w=w,i=i,t=t,$fn=fn);
}    

if(show_nut_cut==true){
  nut_cut(w=w, wi=wi, d=d, i=i, t=t,rot=rot,type=type);
}  
// file: module_dim.scad
include <../bracket/bracket_dim.scad>

module_l=pcb_l+2*bracket_h2+bracket_gap;
module_l1=module_l-2*bracket_h1;
module_h=bracket_l;

function module_w(n)=bracket_w(n);
// main file
// Empty module
// ============

show="assembly"; // [assembly,front,back,print_front,print_back,2d]
open=true; 
n=1; // [1,2,3,4]

include <module_dim.scad>

use <../library/linurs/linurs_screw.scad>
use <../bracket/bracket.scad>
use <../pcb/pcb.scad>

module empty_back(n=1,open=true){
    h=15;  
    difference(){
         translate([0,0,bracket_offset_z])back_bracket(n=n);
         if(open==true){
             translate([
               0,
               h/2+pcb_h,
               pcb_w/2])
             cube([
               bracket_h,
               h,
               pcb_w],center=true);
         }    
    }
}

module empty_front(n=1,open=true){   
    difference(){
         h=15;
         translate([0,0,bracket_offset_z])front_bracket(n=n);
         if(open==true){ 
             translate([
               0,
               h/2+pcb_h,
               pcb_w/2])
             cube([
               bracket_h,
               15,
               pcb_w],center=true);
         }    
    }
}

module empty_assembly(n=1,open=true){
    pcb_assembly();
    empty_front(n=n,open=open);
    translate([pcb_l,0,0])empty_back(n=n,open=open);
}

if(show=="assembly"){
  empty_assembly(n=n,open=open);
}

if(show=="front"){
    empty_front(n=n,open=open);
}

if(show=="back"){
  empty_back(n=n,open=open);
}

if(show=="print_front"){
  rotate([0,-90,0])
    empty_front(n=n,open=open);
}

if(show=="print_back"){
  rotate([0,90,0])empty_back(n=n,open=open);
}

if(show=="2d"){
  translate([-50,-9,-40])empty_assembly(n=n,open=open);
}
